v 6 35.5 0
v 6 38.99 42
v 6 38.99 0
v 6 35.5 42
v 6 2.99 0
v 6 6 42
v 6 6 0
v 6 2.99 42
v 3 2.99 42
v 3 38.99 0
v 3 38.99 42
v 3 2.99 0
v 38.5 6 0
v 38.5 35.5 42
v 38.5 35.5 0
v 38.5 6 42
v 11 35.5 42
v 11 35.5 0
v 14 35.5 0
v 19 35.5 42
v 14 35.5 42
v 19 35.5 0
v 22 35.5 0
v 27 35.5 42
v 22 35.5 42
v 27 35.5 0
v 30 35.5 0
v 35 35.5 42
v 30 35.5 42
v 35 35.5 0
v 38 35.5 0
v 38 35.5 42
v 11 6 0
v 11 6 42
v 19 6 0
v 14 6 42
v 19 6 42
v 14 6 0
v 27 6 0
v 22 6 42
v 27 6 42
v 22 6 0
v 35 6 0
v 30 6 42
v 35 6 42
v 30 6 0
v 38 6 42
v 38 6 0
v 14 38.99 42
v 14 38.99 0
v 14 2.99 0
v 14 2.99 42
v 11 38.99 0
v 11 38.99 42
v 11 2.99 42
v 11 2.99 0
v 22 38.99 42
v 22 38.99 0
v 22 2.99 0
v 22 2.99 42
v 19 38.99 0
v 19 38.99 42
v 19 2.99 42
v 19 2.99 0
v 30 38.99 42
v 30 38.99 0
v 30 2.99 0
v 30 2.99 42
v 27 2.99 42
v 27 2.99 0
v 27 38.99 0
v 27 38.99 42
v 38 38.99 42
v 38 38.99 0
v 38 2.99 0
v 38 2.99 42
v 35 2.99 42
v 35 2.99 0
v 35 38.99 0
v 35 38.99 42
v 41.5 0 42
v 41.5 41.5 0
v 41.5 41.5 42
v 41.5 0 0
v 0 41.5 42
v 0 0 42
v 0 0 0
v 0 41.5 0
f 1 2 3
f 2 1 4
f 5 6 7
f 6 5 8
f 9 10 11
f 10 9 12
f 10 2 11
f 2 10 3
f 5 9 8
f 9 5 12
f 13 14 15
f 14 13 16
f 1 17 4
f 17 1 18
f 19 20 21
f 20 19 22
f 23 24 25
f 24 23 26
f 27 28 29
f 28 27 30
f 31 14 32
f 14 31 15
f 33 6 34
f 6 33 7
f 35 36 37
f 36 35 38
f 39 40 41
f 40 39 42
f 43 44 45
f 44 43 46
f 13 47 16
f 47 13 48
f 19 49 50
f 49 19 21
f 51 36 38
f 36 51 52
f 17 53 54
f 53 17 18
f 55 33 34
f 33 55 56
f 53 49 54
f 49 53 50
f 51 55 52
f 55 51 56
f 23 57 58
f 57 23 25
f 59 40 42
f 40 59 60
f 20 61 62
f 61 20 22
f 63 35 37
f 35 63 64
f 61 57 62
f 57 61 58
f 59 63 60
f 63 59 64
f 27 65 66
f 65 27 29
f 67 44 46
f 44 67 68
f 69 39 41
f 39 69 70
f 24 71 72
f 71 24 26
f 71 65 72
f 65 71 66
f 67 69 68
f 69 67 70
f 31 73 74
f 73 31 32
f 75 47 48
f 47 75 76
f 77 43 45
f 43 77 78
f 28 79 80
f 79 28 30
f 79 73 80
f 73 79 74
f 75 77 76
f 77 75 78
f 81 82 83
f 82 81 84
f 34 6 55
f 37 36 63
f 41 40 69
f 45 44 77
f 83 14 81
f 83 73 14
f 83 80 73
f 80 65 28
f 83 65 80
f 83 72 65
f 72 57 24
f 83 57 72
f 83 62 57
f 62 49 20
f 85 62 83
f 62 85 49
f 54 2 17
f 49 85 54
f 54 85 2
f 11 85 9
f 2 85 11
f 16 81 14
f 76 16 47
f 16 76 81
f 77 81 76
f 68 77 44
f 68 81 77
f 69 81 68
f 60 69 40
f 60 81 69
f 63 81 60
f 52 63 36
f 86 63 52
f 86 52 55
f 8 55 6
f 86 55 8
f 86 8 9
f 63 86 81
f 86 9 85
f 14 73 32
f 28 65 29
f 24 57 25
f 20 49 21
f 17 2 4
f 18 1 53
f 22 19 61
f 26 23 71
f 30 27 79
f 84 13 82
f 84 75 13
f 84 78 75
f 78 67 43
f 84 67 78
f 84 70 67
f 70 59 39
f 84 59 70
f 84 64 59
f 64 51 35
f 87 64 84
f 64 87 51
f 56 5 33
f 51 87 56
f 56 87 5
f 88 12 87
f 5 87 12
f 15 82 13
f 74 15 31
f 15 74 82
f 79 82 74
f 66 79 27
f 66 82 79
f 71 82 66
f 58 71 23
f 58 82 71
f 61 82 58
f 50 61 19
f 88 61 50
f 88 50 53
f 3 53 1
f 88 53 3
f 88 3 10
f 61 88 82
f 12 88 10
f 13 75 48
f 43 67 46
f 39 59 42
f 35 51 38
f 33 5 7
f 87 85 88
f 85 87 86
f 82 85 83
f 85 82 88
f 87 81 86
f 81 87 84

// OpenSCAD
/* [Hidden] */
// Gridfinity

gridfinity_xy_to_mm = 42;
gridfinity_z_to_mm = 7;
gridfinity_tolerance = 0.5;

// rails
rail_depth = 3;
horizontal = 1;
vertical = 2;
rail_slide_depth = 3;

// Offsets to prevent impossibly thin artifacts
removal = -0.01;
addition = 0.01;

// Variables to edit
/* [Gridfinity] */
// Length
gridfinity_x = 1;
// Width
gridfinity_y = 1;
// Height
gridfinity_z = 6;
// How much extra material to leave between exterior and ridges.
gridfinity_wall_thickness = 3;

/* [Rails] */
// How big are the ridges cutouts.
rail_thickness = 3;
// How far between each ridge.
rail_spacing = 5;
// Orientation of the ridges
rail_direction = 2; // [1:horizontal, 2:vertical]


difference(){
    cube([gridfinity_x * gridfinity_xy_to_mm - gridfinity_tolerance,
        gridfinity_y * gridfinity_xy_to_mm - gridfinity_tolerance,
        gridfinity_z * gridfinity_z_to_mm],false);
    
    for(i = [gridfinity_wall_thickness:rail_spacing + rail_thickness:gridfinity_x * gridfinity_xy_to_mm ]){
        if(rail_direction == vertical){
            if(! (i+rail_thickness > gridfinity_x * gridfinity_xy_to_mm - gridfinity_wall_thickness))
            {
                translate([i,removal + gridfinity_wall_thickness,removal])
                    cube(
                        [rail_thickness, 
                        gridfinity_y * gridfinity_xy_to_mm - gridfinity_wall_thickness*2,
                        gridfinity_z*gridfinity_z_to_mm + addition*2]);
            }

            translate([gridfinity_wall_thickness,gridfinity_wall_thickness+rail_depth,removal])
                cube([gridfinity_x * gridfinity_xy_to_mm - gridfinity_tolerance - gridfinity_wall_thickness*2,
                    gridfinity_y * gridfinity_xy_to_mm - gridfinity_tolerance- gridfinity_wall_thickness*2 - rail_depth*2,
                    gridfinity_z * gridfinity_z_to_mm + addition*2],false);

        }
        else if(rail_direction == horizontal){
            if(! (i+rail_thickness > gridfinity_z * gridfinity_z_to_mm - gridfinity_wall_thickness)){
                    translate([removal,removal + gridfinity_wall_thickness,i])
                        cube(
                            [ gridfinity_x*gridfinity_xy_to_mm, 
                            gridfinity_y * gridfinity_xy_to_mm - gridfinity_wall_thickness * 2,
                            rail_thickness]);
            }

            translate([removal,gridfinity_wall_thickness+rail_depth,gridfinity_wall_thickness])
                cube([gridfinity_x * gridfinity_xy_to_mm - gridfinity_tolerance  + addition*2,
                    gridfinity_y * gridfinity_xy_to_mm - gridfinity_tolerance- gridfinity_wall_thickness*2 - rail_depth*2,
                    gridfinity_z * gridfinity_z_to_mm  - gridfinity_wall_thickness*2],false);
        }
        else {
            echo("No rail direction set");
        }
    }
}
